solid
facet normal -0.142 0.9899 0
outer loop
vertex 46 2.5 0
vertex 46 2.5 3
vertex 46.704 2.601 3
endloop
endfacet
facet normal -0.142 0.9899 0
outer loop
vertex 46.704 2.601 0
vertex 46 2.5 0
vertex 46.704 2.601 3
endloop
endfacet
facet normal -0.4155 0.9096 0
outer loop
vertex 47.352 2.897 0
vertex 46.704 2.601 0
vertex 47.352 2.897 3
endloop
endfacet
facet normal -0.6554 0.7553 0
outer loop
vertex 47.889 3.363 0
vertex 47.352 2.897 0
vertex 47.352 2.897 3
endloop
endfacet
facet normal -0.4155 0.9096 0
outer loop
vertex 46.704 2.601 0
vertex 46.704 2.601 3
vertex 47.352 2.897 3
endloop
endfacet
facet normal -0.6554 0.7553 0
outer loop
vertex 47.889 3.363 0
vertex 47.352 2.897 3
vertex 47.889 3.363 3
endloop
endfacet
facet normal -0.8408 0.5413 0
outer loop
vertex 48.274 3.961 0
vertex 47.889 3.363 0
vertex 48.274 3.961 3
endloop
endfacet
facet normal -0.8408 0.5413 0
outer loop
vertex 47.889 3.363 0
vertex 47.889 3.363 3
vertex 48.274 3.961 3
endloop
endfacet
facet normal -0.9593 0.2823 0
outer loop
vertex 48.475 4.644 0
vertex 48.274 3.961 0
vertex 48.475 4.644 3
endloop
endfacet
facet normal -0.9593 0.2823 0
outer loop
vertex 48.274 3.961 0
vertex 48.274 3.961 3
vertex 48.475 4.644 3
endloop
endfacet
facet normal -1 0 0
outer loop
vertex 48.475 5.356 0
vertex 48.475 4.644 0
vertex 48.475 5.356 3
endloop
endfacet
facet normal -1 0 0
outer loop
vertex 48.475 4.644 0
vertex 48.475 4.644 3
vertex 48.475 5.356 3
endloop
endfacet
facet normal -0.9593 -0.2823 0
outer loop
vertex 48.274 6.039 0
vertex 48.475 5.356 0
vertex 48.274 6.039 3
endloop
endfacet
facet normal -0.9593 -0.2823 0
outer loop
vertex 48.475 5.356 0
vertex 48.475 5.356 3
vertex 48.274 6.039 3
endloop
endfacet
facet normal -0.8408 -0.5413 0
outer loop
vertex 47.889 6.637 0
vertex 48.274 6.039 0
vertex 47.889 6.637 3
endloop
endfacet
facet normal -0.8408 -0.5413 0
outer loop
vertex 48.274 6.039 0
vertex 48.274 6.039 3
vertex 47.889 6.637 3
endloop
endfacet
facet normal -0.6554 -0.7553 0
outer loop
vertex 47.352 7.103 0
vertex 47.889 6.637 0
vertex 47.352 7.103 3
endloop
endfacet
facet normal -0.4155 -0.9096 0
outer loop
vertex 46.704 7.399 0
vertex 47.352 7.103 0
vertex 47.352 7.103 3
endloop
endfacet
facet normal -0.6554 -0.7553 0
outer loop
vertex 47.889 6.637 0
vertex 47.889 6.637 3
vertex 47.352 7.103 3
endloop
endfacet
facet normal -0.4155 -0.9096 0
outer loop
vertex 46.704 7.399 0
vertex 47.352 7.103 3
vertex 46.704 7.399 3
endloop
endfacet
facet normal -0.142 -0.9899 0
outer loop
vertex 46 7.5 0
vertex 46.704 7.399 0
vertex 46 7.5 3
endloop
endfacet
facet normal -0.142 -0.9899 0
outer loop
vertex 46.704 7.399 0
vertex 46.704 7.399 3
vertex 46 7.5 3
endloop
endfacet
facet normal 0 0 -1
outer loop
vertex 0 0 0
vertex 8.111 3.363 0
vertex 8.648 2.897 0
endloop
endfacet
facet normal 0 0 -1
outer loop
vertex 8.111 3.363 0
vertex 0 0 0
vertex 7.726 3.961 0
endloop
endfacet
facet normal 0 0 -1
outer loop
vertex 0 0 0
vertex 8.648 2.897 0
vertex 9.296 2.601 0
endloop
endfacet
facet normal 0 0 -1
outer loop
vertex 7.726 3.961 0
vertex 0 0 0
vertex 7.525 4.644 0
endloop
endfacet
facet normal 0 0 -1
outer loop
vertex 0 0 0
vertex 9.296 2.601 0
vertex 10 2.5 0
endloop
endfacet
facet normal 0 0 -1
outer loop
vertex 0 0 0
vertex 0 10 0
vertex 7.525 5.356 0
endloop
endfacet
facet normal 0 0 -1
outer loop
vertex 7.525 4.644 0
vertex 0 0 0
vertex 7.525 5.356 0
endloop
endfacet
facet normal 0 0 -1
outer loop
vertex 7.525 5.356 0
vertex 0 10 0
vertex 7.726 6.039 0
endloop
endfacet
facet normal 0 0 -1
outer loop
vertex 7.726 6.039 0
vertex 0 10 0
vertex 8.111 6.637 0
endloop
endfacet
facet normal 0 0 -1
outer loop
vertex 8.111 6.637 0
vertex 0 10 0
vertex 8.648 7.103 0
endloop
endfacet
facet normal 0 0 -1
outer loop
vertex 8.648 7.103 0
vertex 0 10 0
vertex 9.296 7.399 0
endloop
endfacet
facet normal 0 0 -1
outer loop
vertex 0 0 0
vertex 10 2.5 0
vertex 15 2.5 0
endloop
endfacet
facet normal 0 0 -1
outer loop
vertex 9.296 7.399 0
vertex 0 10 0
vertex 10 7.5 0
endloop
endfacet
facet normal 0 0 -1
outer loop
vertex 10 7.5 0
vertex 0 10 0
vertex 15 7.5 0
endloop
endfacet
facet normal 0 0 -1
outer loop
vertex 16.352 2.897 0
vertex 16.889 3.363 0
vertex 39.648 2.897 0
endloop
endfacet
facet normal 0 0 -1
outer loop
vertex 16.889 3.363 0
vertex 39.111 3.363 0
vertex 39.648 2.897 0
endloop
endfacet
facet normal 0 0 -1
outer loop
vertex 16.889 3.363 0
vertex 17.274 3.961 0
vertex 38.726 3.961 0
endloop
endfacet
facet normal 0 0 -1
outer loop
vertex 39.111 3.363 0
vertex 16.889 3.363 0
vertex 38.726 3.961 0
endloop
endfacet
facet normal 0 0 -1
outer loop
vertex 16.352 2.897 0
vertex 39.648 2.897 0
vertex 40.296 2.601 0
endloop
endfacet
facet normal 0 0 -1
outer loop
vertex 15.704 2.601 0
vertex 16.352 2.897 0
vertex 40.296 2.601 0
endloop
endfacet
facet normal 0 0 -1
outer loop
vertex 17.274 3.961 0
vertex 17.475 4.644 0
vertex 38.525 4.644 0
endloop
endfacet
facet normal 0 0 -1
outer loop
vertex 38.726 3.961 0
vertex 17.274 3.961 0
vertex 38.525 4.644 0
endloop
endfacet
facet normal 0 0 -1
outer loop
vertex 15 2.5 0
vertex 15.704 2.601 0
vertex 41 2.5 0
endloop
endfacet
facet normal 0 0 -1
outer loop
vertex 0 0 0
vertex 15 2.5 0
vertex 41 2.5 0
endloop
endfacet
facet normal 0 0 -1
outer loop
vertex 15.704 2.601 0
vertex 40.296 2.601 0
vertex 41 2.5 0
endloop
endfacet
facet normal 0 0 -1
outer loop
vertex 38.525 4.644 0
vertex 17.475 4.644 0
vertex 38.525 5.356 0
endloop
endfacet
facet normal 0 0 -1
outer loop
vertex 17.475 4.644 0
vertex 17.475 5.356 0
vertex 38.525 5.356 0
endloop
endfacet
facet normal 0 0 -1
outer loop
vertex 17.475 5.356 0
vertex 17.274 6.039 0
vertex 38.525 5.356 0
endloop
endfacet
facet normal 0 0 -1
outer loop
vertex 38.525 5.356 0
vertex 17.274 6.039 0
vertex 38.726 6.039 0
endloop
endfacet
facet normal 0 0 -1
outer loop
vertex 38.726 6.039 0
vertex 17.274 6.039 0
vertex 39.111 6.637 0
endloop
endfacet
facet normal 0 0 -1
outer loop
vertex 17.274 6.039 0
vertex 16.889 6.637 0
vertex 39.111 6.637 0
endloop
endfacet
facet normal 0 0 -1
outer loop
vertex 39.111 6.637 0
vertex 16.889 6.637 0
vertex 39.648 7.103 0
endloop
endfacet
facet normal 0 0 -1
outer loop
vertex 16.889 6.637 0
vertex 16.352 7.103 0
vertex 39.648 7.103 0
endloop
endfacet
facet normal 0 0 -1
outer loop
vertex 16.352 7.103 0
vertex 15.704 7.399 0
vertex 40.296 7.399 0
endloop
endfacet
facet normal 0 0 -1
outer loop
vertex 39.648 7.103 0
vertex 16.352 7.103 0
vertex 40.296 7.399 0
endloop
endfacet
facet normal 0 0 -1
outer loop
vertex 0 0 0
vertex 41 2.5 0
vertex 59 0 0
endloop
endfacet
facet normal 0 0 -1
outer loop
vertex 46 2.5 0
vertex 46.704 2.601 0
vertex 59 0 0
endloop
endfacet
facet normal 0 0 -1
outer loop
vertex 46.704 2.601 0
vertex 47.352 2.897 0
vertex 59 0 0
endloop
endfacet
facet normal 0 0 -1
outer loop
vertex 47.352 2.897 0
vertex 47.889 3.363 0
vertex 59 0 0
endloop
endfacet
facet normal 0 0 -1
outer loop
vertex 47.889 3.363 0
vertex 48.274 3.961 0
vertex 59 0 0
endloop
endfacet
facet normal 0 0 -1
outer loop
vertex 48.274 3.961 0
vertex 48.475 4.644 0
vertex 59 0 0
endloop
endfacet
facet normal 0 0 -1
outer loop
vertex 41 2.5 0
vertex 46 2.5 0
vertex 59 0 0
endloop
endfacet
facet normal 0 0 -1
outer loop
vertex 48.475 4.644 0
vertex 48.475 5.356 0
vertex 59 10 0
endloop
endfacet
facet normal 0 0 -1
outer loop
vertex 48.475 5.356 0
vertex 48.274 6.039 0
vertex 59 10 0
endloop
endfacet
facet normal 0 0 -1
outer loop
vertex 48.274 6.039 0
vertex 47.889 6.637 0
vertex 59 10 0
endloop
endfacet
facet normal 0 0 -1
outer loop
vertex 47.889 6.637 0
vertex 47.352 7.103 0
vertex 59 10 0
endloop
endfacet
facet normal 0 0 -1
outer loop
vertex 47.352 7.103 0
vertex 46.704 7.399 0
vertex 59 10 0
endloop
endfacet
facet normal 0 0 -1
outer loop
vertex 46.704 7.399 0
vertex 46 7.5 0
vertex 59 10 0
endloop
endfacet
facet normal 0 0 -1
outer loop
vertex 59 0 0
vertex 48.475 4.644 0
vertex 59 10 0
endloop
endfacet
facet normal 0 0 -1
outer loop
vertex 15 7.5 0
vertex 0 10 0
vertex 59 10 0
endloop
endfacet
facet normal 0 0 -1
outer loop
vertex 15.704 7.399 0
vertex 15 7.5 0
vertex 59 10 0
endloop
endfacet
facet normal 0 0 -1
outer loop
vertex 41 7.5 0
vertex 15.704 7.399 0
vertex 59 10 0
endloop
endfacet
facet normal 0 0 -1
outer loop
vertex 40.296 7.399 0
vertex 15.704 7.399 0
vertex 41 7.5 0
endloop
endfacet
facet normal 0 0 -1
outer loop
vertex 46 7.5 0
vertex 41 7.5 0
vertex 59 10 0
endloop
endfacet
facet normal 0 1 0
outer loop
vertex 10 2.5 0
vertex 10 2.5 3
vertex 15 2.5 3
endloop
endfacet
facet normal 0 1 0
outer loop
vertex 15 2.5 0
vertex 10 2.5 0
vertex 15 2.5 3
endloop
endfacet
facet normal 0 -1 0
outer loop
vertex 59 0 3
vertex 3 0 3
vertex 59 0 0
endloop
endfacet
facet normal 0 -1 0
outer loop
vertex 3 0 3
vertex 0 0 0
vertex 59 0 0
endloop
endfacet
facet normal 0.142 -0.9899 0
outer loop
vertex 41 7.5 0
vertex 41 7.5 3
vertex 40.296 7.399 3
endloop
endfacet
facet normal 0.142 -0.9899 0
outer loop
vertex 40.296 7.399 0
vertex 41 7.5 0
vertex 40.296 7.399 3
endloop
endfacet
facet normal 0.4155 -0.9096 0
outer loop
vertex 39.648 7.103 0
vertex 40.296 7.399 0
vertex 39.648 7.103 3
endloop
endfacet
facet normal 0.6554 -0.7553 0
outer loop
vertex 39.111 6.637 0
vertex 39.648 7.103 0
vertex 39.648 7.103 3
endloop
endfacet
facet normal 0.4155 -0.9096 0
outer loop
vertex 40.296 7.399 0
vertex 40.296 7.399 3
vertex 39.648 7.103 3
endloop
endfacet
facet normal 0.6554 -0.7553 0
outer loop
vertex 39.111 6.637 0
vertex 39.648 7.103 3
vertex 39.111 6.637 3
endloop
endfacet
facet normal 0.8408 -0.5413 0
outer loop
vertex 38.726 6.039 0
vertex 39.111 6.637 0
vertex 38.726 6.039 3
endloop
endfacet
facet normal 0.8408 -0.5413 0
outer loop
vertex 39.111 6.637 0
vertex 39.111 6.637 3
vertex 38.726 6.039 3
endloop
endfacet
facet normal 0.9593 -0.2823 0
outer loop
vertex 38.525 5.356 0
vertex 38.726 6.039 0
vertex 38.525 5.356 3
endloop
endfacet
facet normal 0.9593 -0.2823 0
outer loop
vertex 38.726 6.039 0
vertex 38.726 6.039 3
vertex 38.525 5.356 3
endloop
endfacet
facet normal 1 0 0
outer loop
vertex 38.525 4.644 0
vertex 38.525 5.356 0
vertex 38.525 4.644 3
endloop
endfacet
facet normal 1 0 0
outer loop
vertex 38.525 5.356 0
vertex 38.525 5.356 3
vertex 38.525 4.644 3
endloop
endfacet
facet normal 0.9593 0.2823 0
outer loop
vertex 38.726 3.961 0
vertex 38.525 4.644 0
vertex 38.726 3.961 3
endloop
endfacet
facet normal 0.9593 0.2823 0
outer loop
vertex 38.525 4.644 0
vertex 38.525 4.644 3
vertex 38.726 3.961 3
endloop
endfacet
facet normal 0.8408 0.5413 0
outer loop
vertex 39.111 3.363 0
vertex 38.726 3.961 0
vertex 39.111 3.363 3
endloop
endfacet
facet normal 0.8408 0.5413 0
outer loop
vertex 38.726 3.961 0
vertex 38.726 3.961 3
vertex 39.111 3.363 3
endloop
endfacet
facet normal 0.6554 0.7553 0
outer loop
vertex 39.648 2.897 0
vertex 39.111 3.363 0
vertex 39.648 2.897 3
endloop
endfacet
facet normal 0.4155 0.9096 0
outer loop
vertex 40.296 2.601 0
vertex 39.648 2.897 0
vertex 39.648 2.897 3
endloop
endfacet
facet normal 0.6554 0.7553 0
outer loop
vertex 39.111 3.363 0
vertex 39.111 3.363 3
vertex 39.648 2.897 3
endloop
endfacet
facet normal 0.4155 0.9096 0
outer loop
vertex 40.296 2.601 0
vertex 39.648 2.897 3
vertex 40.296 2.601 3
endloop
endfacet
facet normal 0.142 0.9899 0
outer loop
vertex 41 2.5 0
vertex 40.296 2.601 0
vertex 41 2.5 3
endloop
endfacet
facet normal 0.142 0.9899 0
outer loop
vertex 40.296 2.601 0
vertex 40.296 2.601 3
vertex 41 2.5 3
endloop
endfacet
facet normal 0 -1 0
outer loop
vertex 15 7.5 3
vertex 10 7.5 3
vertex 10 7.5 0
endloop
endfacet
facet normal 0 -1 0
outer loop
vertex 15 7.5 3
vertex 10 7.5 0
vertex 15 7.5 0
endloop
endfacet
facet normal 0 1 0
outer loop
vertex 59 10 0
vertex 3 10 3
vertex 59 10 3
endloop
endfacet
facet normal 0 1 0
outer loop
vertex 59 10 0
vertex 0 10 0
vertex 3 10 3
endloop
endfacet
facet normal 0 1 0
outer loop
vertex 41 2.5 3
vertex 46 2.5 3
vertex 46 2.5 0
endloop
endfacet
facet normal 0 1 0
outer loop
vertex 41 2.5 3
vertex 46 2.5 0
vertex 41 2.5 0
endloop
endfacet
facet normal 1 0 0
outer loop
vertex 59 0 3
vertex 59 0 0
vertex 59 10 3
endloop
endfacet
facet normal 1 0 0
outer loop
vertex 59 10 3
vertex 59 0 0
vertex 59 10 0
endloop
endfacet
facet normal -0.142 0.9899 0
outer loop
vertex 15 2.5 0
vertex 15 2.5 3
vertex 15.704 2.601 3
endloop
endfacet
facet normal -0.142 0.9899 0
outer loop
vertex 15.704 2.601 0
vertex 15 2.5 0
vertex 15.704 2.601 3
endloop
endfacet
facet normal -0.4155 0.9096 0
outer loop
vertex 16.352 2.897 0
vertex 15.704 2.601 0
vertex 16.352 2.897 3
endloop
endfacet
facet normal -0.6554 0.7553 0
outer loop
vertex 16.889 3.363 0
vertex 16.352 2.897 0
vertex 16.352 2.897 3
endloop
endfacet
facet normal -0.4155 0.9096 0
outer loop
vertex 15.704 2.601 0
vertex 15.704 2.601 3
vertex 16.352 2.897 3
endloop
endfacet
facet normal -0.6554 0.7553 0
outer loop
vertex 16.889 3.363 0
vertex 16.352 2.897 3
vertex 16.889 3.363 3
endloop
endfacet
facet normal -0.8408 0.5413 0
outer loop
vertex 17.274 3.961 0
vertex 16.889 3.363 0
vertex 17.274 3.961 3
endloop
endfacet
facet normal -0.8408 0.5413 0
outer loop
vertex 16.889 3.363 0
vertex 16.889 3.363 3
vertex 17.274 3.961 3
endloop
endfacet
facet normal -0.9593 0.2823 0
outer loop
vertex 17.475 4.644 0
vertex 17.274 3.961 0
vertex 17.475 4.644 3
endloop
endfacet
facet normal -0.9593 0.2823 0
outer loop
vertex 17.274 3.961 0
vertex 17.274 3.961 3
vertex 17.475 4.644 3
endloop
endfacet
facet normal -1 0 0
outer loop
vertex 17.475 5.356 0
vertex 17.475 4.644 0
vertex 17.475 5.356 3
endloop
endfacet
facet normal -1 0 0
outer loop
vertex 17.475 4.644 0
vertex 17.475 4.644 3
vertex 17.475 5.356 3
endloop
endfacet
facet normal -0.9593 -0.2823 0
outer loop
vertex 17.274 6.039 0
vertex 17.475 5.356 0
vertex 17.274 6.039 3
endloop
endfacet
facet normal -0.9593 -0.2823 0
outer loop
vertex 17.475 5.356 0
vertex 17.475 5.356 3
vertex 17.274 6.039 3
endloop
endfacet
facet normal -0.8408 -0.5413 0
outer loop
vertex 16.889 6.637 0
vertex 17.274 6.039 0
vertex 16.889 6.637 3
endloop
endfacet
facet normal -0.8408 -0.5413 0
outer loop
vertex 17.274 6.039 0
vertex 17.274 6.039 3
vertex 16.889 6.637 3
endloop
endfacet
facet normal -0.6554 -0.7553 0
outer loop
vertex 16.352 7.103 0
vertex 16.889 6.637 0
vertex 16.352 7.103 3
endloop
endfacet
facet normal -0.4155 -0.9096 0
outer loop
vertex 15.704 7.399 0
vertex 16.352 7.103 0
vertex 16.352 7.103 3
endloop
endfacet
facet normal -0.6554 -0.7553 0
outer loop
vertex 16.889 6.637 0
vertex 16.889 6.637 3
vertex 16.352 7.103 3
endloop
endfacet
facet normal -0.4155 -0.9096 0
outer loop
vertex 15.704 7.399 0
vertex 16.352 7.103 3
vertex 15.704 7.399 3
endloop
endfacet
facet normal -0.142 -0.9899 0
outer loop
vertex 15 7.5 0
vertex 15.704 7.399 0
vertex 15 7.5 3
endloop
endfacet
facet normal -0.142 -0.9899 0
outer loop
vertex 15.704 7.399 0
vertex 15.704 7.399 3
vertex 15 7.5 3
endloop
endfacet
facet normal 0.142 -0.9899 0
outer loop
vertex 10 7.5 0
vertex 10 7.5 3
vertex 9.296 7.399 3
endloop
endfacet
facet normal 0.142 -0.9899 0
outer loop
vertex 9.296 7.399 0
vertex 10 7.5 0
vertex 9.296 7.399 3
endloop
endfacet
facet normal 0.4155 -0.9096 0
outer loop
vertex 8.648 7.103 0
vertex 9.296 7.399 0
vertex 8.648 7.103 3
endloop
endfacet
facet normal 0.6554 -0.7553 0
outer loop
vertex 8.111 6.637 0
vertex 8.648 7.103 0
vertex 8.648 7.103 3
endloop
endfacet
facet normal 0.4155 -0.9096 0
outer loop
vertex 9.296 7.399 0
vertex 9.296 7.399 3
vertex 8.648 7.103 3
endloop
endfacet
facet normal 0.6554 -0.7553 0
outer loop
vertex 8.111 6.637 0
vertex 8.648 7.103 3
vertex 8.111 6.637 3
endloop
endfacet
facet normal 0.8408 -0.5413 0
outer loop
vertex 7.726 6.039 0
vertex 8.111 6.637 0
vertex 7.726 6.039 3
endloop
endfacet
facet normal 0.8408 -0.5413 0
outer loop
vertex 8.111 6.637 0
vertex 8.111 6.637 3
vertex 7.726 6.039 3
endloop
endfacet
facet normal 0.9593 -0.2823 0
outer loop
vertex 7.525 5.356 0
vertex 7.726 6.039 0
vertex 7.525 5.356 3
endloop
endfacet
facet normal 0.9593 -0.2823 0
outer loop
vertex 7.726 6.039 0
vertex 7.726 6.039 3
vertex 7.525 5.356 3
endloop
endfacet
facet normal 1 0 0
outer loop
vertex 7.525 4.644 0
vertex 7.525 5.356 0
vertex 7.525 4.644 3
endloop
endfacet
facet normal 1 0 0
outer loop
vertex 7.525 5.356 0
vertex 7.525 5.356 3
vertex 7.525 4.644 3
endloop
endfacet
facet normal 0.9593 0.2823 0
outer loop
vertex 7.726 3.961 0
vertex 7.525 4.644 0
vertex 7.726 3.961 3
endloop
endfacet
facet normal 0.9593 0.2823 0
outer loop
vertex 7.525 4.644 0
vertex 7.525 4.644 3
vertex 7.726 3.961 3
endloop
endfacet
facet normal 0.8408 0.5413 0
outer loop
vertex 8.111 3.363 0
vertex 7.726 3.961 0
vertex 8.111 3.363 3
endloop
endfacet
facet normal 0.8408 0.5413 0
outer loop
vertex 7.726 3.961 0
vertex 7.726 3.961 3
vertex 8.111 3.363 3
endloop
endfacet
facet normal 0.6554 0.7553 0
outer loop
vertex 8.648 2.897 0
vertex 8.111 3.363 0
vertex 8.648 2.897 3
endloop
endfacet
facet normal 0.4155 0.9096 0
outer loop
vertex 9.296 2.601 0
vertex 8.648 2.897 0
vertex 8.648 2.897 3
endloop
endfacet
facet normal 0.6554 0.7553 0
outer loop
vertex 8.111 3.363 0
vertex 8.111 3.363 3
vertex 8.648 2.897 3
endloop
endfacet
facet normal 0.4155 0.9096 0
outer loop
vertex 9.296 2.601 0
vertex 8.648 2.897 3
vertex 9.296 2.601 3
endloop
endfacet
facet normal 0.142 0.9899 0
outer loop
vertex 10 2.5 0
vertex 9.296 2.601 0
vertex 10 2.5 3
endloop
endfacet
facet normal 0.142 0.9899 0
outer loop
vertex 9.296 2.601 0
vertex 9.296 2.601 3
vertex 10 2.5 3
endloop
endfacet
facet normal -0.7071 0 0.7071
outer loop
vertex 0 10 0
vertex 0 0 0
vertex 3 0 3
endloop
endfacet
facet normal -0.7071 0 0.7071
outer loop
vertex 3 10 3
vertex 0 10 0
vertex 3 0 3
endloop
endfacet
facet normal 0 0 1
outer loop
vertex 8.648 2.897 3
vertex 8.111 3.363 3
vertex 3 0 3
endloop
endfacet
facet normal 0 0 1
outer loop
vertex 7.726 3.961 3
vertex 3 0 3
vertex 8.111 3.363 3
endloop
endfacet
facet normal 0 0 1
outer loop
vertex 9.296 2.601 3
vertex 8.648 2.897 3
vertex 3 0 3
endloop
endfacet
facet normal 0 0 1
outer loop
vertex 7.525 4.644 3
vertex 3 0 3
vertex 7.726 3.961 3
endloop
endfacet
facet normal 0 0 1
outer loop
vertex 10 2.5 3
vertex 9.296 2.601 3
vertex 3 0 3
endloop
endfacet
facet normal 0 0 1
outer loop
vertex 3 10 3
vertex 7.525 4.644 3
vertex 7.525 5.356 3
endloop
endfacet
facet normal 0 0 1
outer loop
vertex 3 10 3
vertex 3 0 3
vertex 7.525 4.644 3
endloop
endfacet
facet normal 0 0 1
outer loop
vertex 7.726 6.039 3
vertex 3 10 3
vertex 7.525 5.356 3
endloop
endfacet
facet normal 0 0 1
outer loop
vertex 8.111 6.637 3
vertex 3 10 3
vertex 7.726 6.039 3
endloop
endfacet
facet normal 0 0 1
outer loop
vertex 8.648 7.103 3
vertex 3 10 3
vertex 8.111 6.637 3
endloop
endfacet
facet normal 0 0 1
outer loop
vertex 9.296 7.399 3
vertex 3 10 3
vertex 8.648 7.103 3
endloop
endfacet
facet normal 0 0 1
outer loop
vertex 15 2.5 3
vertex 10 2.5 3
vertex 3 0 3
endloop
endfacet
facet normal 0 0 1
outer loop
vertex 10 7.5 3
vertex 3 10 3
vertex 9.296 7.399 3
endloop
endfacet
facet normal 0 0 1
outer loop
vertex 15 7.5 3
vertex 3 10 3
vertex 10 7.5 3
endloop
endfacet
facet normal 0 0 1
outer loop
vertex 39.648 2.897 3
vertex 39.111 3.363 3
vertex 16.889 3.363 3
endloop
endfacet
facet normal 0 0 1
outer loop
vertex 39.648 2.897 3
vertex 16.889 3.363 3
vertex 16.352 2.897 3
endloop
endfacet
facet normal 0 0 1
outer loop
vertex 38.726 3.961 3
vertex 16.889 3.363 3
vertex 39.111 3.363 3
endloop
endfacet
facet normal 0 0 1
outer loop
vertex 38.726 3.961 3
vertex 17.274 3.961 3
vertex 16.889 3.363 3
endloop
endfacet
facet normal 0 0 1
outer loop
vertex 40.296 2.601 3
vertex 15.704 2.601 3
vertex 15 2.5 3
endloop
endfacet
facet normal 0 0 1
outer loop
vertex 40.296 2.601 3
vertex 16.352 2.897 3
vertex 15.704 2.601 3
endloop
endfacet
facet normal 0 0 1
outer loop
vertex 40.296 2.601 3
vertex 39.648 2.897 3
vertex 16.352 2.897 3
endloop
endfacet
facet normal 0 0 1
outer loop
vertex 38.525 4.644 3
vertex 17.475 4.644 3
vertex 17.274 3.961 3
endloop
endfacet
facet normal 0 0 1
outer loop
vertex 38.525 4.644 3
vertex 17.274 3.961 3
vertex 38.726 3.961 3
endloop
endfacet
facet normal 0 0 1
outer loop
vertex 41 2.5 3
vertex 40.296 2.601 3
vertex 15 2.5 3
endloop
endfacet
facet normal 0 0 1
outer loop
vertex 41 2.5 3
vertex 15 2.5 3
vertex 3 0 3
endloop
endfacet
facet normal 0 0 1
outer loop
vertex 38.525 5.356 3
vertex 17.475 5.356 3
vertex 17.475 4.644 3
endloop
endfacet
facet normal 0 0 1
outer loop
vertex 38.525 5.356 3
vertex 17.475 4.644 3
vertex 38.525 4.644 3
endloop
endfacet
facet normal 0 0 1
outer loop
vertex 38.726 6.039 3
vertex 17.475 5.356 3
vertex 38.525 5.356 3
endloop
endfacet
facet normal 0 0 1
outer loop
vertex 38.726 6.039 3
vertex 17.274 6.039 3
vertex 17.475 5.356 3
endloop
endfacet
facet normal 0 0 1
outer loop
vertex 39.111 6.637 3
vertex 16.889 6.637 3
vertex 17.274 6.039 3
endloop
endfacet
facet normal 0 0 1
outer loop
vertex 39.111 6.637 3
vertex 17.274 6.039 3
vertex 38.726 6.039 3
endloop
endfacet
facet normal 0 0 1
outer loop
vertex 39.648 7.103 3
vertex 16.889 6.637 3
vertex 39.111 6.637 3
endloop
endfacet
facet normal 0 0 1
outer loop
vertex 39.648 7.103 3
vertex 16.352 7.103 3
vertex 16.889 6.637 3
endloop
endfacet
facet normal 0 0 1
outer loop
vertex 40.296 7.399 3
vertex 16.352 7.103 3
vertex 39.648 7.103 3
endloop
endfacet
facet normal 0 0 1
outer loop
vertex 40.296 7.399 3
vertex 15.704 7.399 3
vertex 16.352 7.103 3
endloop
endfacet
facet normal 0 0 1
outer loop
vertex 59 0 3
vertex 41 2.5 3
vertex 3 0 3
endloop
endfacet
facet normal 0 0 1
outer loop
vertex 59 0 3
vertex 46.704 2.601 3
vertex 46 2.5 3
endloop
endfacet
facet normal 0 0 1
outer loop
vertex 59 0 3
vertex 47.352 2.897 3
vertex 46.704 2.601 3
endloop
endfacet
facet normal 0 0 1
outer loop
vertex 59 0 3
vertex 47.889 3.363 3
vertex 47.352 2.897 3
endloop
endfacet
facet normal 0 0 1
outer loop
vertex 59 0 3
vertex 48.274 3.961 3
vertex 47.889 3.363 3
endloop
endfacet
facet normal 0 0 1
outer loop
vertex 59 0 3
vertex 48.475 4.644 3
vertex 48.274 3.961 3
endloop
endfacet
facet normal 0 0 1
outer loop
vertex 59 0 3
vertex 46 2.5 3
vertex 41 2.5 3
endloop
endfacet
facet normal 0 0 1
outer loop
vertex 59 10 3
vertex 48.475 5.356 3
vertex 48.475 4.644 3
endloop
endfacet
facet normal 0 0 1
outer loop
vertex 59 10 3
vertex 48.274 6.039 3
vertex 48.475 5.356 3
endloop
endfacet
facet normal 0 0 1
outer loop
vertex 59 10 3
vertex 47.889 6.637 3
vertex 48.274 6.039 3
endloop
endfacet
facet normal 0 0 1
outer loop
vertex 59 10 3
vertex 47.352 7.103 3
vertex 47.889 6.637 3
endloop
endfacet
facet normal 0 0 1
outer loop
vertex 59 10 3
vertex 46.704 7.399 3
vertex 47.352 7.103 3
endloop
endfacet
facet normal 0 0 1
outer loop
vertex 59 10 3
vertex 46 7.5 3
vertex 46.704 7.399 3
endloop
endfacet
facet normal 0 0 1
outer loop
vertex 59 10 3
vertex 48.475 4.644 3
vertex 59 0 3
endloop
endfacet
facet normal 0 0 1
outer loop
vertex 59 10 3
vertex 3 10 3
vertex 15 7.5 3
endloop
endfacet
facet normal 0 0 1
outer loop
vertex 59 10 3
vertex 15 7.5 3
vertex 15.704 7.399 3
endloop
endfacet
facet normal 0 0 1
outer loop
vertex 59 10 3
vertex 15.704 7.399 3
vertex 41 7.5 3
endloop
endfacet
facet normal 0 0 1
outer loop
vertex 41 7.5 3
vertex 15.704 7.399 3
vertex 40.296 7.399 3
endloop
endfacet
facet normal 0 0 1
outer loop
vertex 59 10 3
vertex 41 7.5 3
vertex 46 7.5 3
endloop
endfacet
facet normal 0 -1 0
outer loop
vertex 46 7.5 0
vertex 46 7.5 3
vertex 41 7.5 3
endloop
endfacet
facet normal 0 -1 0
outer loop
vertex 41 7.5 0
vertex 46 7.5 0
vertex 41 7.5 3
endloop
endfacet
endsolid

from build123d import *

# Parameters (mm, degrees)
SKETCH_W        = 59
SKETCH_H        = 10
PAD_DEPTH       = 3
POCKET_DEPTH    = 10.001
POCKET001_DEPTH = 3.001


with BuildPart() as part:
    # Sketch → Pad (new body)
    with BuildSketch(Plane.XY):
        with Locations((29.5, 5)):
            Rectangle(SKETCH_W, SKETCH_H)
    extrude(amount=PAD_DEPTH)

    # Sketch001 (on Face3 of Pad) → Pocket (cut, through all)
    with BuildSketch(Plane.XZ):
        Polygon((0, 0), (3, 3), (0, 3), align=None)
    extrude(amount=-POCKET_DEPTH, mode=Mode.SUBTRACT)

    # Sketch002 (on Face4 of Pocket) → Pocket001 (cut, through all)
    with BuildSketch(Plane.XY.offset(3)):
        with BuildLine():
            ThreePointArc((10, 7.5), (7.5, 5), (10, 2.5))
            Line((10, 2.5), (15, 2.5))
            ThreePointArc((15, 2.5), (17.5, 5), (15, 7.5))
            Line((10, 7.5), (15, 7.5))
        make_face()
        with BuildLine():
            ThreePointArc((46, 2.5), (48.5, 5), (46, 7.5))
            Line((46, 7.5), (41, 7.5))
            ThreePointArc((41, 7.5), (38.5, 5), (41, 2.5))
            Line((46, 2.5), (41, 2.5))
        make_face()
    extrude(amount=-POCKET001_DEPTH, mode=Mode.SUBTRACT)


solid = part.part
